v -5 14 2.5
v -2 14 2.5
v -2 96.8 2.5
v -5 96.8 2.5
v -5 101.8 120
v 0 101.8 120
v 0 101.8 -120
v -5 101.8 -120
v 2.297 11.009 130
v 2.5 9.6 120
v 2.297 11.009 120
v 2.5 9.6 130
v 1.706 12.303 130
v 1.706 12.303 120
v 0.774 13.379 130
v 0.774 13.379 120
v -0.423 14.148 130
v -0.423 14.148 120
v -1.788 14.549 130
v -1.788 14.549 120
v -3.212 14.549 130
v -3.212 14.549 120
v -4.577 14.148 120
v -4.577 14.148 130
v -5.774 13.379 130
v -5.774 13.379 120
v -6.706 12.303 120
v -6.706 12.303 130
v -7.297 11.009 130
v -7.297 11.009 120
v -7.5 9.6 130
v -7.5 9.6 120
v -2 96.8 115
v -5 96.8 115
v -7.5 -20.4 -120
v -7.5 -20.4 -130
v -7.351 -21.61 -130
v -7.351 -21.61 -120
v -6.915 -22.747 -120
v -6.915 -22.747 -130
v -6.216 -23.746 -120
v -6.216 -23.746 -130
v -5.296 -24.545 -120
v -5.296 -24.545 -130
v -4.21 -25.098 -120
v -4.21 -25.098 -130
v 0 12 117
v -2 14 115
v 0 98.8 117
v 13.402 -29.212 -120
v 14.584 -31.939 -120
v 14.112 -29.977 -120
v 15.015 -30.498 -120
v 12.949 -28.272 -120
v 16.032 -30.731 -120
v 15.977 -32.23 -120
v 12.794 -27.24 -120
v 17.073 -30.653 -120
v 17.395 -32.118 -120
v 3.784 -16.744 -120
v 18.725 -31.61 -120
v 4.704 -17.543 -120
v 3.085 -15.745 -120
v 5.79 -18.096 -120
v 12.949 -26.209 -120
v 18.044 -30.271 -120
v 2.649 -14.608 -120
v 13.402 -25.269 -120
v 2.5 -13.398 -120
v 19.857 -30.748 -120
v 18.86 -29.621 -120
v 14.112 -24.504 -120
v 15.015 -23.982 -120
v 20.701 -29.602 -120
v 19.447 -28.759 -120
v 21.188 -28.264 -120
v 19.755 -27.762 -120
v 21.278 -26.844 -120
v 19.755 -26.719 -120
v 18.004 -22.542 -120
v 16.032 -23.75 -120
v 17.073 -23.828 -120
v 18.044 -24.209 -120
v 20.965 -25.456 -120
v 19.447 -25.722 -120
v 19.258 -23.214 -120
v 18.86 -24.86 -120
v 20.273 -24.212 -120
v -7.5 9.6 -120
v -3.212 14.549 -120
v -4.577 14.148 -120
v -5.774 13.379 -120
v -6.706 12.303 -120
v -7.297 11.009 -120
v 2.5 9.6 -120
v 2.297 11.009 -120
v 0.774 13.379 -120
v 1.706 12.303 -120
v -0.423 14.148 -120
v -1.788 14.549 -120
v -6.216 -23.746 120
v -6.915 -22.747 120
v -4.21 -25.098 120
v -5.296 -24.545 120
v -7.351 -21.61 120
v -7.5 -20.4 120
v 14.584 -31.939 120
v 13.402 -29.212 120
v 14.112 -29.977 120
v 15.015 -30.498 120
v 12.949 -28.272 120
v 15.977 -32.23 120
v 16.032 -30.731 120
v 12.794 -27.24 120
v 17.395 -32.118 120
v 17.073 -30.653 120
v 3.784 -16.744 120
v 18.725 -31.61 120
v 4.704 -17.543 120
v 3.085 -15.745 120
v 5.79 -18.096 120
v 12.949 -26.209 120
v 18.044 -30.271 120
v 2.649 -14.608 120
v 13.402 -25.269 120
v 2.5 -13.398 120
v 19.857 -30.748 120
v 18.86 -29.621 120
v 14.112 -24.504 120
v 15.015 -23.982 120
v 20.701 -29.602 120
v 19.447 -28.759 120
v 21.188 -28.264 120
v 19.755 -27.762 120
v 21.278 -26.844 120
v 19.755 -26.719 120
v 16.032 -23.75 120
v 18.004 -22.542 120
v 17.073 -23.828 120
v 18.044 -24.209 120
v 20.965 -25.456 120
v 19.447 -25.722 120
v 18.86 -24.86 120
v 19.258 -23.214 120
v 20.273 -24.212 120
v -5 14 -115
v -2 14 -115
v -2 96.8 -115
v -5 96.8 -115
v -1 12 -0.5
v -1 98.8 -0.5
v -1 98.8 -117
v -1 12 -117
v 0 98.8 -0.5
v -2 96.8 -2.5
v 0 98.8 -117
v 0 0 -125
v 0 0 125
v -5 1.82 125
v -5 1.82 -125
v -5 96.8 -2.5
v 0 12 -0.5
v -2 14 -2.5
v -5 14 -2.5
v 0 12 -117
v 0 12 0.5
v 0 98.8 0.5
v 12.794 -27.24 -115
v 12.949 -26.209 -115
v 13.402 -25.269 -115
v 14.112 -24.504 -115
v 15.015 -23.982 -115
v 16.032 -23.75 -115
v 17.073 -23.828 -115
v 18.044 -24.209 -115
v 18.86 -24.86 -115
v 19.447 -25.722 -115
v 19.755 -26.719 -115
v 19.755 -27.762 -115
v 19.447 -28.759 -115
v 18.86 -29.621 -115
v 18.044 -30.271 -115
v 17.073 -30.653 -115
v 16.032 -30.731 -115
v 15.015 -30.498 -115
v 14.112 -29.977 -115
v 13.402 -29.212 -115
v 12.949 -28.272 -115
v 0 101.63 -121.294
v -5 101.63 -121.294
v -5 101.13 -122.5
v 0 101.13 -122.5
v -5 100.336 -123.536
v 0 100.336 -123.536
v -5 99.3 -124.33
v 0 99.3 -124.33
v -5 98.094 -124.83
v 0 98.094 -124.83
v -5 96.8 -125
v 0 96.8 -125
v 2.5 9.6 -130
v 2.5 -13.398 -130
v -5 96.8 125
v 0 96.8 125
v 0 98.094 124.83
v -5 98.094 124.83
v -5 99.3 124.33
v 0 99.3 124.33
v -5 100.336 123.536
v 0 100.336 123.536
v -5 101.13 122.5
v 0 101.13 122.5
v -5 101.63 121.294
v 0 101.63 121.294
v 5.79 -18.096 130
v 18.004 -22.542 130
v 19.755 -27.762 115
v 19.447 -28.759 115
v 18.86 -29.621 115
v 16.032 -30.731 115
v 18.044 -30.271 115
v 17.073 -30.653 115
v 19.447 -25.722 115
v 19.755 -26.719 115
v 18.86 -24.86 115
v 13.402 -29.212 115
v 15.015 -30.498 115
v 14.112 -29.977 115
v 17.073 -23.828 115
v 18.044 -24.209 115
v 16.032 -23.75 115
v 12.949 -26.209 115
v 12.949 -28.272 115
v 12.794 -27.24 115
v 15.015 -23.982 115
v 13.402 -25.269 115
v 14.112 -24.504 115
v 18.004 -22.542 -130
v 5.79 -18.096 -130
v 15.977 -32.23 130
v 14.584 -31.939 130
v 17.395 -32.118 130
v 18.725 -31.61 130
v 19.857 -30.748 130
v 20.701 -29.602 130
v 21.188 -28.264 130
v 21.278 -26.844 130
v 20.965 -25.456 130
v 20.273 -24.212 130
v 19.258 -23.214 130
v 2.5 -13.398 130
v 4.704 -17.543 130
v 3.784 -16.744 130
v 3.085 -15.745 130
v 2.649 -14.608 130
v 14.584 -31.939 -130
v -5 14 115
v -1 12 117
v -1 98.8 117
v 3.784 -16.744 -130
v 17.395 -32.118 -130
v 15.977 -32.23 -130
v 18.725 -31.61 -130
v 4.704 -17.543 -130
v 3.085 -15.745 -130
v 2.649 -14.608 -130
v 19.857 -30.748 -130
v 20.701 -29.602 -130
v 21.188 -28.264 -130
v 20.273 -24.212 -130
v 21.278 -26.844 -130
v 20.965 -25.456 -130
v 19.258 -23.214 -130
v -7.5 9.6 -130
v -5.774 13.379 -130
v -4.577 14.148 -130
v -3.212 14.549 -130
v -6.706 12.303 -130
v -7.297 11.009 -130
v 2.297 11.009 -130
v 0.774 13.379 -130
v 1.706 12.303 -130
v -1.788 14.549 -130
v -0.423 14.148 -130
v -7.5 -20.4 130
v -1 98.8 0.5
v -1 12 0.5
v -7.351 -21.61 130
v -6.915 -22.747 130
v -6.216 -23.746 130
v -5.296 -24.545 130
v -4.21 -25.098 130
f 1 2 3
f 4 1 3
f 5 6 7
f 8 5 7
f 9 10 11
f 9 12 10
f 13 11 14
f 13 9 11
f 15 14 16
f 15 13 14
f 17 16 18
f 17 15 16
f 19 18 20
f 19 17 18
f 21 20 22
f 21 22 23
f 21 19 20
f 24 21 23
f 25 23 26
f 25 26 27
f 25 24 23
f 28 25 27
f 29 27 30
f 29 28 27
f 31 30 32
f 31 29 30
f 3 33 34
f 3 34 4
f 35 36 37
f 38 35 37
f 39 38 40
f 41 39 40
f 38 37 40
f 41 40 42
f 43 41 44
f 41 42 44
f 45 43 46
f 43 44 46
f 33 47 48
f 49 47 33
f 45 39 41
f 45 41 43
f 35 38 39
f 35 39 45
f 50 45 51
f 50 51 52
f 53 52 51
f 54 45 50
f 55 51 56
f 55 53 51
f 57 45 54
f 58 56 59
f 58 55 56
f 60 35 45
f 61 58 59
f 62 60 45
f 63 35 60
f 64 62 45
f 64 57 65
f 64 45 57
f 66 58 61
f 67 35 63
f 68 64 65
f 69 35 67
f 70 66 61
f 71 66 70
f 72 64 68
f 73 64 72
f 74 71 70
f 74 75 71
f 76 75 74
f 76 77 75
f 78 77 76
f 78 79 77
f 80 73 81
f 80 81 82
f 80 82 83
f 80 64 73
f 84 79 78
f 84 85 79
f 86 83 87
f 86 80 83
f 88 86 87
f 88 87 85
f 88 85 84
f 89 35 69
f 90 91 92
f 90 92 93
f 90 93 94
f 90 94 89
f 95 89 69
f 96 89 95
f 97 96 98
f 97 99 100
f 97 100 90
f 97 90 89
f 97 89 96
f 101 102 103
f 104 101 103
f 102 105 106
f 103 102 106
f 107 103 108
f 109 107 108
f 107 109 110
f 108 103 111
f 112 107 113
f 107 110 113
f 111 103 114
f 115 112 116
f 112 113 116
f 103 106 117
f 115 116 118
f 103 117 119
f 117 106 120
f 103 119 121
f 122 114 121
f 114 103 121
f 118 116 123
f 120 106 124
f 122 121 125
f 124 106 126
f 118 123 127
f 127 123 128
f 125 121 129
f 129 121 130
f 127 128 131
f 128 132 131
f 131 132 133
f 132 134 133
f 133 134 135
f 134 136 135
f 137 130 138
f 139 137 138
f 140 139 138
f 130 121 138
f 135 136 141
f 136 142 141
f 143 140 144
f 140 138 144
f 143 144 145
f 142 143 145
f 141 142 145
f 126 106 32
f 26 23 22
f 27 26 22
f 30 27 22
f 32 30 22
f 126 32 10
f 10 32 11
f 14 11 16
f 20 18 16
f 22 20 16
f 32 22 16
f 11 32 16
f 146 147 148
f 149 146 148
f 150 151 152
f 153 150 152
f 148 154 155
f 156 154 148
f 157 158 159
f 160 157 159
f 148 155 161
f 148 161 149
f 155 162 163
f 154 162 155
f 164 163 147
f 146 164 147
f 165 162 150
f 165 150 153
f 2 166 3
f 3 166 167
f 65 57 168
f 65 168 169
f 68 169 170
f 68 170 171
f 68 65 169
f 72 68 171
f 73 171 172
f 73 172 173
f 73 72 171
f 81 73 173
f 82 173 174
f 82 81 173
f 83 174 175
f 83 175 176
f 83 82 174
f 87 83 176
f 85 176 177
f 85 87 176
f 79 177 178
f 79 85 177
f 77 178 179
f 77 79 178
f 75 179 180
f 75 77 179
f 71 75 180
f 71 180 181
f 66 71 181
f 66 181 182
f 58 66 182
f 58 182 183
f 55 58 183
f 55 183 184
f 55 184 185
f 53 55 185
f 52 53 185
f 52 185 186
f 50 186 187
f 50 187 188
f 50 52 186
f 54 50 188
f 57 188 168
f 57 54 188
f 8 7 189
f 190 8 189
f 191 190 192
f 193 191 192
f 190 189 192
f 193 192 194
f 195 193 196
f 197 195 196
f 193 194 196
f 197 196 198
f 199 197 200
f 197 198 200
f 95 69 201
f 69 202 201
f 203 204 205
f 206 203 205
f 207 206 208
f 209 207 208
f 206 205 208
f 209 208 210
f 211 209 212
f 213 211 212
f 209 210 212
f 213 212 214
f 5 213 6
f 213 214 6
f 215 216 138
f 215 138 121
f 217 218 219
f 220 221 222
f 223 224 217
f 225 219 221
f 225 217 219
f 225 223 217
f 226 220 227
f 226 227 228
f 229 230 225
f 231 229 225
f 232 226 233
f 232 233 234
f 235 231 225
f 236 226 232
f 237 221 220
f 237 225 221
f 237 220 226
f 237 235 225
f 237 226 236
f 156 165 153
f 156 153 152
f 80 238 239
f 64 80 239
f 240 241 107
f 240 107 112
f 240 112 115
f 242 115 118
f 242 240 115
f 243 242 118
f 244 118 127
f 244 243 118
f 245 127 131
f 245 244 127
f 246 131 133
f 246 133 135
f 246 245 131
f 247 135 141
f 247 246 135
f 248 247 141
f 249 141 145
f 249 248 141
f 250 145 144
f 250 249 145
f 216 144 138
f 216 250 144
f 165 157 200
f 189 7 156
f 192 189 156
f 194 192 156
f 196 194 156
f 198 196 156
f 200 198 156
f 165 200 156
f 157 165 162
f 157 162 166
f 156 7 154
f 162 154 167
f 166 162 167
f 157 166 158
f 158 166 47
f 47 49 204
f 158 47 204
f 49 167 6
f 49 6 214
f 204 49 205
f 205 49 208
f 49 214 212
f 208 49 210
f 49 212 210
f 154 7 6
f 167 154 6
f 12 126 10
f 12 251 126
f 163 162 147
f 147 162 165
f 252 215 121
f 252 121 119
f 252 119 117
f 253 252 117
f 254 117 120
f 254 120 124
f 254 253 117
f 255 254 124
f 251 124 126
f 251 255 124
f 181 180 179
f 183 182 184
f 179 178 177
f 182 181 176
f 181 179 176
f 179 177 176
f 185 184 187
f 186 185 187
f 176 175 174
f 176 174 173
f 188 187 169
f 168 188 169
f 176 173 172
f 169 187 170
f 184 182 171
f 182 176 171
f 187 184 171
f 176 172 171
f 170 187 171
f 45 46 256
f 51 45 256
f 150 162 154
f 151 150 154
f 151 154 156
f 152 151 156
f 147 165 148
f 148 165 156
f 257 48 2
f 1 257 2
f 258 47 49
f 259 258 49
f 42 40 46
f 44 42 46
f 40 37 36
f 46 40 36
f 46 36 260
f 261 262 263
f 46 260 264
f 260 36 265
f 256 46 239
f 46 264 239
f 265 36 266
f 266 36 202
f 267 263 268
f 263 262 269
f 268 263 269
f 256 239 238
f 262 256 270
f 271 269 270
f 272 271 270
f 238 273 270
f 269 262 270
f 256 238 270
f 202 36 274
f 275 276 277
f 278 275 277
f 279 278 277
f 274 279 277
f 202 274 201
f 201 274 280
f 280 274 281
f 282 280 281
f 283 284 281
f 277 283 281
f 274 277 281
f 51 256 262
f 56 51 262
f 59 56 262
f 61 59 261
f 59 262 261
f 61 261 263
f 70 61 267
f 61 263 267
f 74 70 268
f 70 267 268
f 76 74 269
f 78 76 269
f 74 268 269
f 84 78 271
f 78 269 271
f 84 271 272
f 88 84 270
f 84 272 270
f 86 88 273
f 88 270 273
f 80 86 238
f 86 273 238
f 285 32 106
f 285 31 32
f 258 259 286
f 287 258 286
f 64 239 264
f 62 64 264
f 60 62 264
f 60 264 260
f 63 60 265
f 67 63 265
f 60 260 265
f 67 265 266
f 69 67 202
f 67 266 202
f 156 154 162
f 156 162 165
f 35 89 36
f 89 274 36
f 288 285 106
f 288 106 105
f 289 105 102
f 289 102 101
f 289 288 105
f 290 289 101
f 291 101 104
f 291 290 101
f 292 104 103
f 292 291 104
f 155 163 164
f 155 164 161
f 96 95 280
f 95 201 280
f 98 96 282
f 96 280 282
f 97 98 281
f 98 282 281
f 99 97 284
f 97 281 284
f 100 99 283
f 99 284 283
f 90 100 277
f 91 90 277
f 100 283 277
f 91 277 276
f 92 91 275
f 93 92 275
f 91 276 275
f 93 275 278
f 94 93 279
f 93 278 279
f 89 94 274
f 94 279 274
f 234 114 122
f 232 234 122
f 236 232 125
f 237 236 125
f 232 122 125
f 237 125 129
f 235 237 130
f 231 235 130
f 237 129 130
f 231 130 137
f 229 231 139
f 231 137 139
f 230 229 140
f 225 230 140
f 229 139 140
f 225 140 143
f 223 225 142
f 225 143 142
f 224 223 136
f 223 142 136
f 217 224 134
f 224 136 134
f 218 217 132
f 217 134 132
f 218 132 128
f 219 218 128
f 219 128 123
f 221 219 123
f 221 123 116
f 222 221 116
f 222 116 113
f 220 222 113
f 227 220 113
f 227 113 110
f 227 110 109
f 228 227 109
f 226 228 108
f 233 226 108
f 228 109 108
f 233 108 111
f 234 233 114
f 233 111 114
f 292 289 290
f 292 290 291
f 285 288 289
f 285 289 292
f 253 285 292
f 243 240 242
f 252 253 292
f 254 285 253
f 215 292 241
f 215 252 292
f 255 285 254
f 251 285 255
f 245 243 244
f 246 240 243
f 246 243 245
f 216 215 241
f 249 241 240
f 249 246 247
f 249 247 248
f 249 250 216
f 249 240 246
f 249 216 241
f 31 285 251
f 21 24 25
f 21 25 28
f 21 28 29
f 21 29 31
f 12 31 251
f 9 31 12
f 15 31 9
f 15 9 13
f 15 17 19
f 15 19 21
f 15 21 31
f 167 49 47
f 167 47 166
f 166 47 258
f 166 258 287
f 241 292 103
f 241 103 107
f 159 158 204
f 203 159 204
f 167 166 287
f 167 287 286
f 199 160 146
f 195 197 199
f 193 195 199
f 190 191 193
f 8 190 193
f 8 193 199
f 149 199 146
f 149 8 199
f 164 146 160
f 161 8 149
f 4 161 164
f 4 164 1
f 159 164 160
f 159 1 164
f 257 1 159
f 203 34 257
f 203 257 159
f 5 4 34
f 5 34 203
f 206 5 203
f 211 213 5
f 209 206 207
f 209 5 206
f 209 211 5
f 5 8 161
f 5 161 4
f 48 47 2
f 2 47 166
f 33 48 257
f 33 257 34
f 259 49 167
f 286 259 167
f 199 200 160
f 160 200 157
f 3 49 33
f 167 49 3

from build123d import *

# Parameters (mm, degrees)
IZIM1_W                       = 112.5
IZIM1_H                       = 82.8
Y_KSEKLIK_EKSTR_ZYON1_DEPTH   = 5
PAH1_SIZE                     = 2
KES_EKSTR_ZYON1_DEPTH         = 270.978221344
Y_KSEKLIK_EKSTR_ZYON2_DEPTH   = 5
IZIM4_R                       = 3.5
Y_KSEKLIK_EKSTR_ZYON3_DEPTH   = 5
IZIM5_W                       = 116.5
IZIM5_H                       = 86.8
Y_KSEKLIK_EKSTR_ZYON4_DEPTH   = 1
Y_KSEKLIK_EKSTR_ZYON4_2_DEPTH = 1


with BuildPart() as part:
    # Çizim1 → Yükseklik-Ekstrüzyon1 (new body)
    with BuildSketch(Plane(origin=(0, 0, 0), x_dir=(0, 0, -1), z_dir=(1, 0, 0))):
        with BuildLine():
            Line((-120, 101.8), (120, 101.8))
            ThreePointArc((120, 101.8), (123.535533906, 100.335533906), (125, 96.8))
            Line((125, 96.8), (125, 0))
            Line((125, 0), (-125, 0))
            Line((-125, 0), (-125, 96.8))
            ThreePointArc((-125, 96.8), (-123.535533906, 100.335533906), (-120, 101.8))
        make_face()
        with Locations((58.75, 55.4)):
            Rectangle(IZIM1_W, IZIM1_H, mode=Mode.SUBTRACT)
        with Locations((-58.75, 55.4)):
            Rectangle(IZIM1_W, IZIM1_H, mode=Mode.SUBTRACT)
    extrude(amount=-Y_KSEKLIK_EKSTR_ZYON1_DEPTH)

    # Pah1
    pah1_edges = [part.edges().sort_by_distance(p)[0] for p in [
        (0, 55.4, 115),
        (0, 14, 58.75),
        (0, 55.4, 2.5),
        (0, 96.8, 58.75),
        (0, 55.4, -115),
        (0, 96.8, -58.75),
        (0, 55.4, -2.5),
        (0, 14, -58.75),
    ]]
    chamfer(pah1_edges, length=PAH1_SIZE)

    # Çizim2 → Kes-Ekstrüzyon1 (cut, through all)
    with BuildSketch(Plane.XY.offset(125)):
        Polygon((-5, 0), (0, 0), (-5, 1.819851171), align=None)
    extrude(amount=-KES_EKSTR_ZYON1_DEPTH, mode=Mode.SUBTRACT)


with BuildPart() as body_2:
    # Çizim3 → Yükseklik-Ekstrüzyon2 (new, symmetric)
    with BuildSketch(Plane.XY.offset(125)):
        with BuildLine():
            Line((-7.5, 9.6), (-7.5, -20.4))
            ThreePointArc((-7.5, -20.4), (-6.595760221, -23.267882182), (-4.210100717, -25.098463104))
            Line((-4.210100717, -25.098463104), (14.583751699, -31.93886597))
            ThreePointArc((14.583751699, -31.93886597), (20.99231552, -28.950503583), (18.003953132, -22.541939763))
            Line((18.003953132, -22.541939763), (5.789899283, -18.096387722))
            ThreePointArc((5.789899283, -18.096387722), (3.404239779, -16.2658068), (2.5, -13.397924618))
            Line((2.5, -13.397924618), (2.5, 9.6))
            ThreePointArc((2.5, 9.6), (-2.5, 14.6), (-7.5, 9.6))
        make_face()
    extrude(amount=Y_KSEKLIK_EKSTR_ZYON2_DEPTH, both=True)

    # Çizim4 → Yükseklik-Ekstrüzyon3 (add)
    with BuildSketch(Plane(origin=(0, 0, 120), x_dir=(-1, 0, 0), z_dir=(0, 0, -1))):
        with Locations((-16.293852416, -27.240402867)):
            Circle(IZIM4_R)
    extrude(amount=Y_KSEKLIK_EKSTR_ZYON3_DEPTH)


with BuildPart() as body_3:
    # Aynalama1: mirrored copy
    add(body_2.part.mirror(Plane.XY))


with BuildPart() as body_4:
    # Çizim5 → Yükseklik-Ekstrüzyon4 (new body)
    with BuildSketch(Plane(origin=(0, 0, 0), x_dir=(0, 0, -1), z_dir=(1, 0, 0))):
        with Locations((58.75, 55.4)):
            Rectangle(IZIM5_W, IZIM5_H)
    extrude(amount=-Y_KSEKLIK_EKSTR_ZYON4_DEPTH)


with BuildPart() as body_5:
    # Çizim5 → Y_kseklik-Ekstr_zyon4 2 (new body)
    with BuildSketch(Plane(origin=(0, 0, 0), x_dir=(0, 0, -1), z_dir=(1, 0, 0))):
        with Locations((-58.75, 55.4)):
            Rectangle(IZIM5_W, IZIM5_H)
    extrude(amount=-Y_KSEKLIK_EKSTR_ZYON4_2_DEPTH)


solid = Compound([part.part, body_2.part, body_3.part, body_4.part, body_5.part])
